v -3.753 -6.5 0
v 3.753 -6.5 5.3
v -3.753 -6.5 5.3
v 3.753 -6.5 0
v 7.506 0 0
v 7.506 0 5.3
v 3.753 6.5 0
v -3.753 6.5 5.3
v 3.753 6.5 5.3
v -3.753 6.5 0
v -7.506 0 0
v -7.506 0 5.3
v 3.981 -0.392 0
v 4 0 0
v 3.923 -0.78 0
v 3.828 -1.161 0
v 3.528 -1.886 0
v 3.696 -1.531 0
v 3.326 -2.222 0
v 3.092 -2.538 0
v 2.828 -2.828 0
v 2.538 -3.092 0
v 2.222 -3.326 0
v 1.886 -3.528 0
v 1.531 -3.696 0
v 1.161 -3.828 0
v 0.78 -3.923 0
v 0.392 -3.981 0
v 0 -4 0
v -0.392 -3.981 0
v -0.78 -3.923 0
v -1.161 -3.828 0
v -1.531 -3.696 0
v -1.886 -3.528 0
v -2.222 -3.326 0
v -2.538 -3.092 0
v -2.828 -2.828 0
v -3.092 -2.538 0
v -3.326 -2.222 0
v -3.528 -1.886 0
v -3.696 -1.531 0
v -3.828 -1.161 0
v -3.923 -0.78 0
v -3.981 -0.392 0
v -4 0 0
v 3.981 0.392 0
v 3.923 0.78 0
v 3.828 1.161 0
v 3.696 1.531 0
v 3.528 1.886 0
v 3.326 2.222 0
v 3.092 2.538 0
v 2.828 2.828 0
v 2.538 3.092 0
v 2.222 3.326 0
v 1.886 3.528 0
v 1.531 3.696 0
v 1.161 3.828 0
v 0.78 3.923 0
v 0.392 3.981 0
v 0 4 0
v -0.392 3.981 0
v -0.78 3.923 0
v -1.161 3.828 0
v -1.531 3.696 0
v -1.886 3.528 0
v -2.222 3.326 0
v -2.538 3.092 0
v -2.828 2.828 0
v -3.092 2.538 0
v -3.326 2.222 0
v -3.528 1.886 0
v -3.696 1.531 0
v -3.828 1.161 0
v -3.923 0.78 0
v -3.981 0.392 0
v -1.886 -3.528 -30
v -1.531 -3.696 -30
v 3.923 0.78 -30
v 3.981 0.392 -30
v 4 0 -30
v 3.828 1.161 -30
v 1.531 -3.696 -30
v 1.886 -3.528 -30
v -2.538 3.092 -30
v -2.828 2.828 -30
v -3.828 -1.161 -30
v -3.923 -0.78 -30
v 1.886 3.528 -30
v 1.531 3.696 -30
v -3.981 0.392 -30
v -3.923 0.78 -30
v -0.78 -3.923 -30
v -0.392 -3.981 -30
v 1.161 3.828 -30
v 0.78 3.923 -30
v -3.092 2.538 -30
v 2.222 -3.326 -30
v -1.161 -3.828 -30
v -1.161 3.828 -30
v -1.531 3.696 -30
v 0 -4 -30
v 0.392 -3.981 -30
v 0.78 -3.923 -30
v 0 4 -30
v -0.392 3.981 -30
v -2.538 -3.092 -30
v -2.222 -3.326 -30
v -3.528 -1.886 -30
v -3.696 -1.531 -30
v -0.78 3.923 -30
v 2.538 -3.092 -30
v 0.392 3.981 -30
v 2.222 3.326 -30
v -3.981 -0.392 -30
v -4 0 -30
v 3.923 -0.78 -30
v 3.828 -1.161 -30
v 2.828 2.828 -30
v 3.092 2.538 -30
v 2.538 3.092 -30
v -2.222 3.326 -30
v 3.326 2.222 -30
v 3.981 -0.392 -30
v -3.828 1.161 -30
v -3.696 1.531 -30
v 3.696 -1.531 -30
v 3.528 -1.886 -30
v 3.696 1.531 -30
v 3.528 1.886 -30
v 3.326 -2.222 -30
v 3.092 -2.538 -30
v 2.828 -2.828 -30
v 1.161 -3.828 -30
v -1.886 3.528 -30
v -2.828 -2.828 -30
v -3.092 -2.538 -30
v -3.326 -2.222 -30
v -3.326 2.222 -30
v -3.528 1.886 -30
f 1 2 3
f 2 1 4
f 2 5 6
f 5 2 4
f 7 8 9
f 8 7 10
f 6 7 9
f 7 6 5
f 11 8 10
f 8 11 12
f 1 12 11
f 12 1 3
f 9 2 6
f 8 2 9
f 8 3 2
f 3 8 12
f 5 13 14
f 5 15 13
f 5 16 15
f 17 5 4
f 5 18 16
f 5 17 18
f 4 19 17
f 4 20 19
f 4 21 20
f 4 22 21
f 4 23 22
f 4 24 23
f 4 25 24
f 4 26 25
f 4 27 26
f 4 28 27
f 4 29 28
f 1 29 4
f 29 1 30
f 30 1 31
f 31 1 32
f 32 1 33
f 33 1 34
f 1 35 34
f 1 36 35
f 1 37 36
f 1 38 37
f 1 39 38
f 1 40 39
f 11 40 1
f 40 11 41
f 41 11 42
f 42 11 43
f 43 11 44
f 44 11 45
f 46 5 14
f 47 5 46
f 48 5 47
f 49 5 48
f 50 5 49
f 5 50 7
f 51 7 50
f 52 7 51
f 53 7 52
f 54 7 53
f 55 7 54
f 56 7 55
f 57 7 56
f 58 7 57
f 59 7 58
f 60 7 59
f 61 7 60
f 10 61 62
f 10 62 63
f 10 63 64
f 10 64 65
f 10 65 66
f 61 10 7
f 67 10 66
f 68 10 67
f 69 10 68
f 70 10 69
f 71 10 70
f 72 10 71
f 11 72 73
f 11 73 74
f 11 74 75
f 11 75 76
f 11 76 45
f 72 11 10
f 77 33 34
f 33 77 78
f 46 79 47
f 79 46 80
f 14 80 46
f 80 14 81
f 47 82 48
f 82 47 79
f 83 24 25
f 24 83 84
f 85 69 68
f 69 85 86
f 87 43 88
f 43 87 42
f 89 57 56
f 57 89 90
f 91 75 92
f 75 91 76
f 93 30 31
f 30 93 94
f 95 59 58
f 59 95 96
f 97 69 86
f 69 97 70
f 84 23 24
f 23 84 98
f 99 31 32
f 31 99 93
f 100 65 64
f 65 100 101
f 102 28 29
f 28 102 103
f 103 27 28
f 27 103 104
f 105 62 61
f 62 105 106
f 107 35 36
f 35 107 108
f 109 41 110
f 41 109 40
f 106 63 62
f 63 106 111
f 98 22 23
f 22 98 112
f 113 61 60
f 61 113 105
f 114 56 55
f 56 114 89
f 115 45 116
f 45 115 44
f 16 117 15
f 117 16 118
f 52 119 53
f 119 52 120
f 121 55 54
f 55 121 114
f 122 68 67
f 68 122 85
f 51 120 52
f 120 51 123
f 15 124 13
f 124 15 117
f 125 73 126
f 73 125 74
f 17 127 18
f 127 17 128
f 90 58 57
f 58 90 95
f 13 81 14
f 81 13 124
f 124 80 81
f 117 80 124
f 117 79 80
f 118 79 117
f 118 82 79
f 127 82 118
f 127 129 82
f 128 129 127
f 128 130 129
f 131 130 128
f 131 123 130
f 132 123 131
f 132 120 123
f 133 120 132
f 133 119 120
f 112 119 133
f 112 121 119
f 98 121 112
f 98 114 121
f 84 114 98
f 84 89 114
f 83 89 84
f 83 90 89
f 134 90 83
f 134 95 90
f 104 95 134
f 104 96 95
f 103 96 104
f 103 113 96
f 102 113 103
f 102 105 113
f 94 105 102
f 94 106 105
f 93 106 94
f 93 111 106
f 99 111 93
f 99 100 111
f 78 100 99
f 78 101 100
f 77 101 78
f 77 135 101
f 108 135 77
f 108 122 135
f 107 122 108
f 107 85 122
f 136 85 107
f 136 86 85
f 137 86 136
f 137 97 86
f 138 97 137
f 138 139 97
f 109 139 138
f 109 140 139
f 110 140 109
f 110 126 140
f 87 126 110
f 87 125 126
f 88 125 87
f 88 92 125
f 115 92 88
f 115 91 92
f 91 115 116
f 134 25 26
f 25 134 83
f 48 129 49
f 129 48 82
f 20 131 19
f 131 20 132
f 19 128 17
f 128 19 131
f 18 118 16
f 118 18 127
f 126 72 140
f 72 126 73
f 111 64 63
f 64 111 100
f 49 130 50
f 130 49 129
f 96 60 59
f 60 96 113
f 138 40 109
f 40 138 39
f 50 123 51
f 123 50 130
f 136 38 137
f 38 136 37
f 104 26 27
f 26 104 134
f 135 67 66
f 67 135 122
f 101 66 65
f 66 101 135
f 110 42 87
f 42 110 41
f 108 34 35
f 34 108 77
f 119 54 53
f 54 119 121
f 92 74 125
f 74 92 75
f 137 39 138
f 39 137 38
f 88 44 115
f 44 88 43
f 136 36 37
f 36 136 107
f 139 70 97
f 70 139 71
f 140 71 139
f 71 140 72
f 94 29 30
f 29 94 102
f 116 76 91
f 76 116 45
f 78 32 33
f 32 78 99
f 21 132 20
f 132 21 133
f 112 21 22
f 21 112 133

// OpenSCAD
union() {
    cylinder(h = 5.3, r = 13 / sqrt(3), $fn = 6);
    translate([0, 0, -30])
        cylinder(h = 30, d = 8, $fn = 64);
}
